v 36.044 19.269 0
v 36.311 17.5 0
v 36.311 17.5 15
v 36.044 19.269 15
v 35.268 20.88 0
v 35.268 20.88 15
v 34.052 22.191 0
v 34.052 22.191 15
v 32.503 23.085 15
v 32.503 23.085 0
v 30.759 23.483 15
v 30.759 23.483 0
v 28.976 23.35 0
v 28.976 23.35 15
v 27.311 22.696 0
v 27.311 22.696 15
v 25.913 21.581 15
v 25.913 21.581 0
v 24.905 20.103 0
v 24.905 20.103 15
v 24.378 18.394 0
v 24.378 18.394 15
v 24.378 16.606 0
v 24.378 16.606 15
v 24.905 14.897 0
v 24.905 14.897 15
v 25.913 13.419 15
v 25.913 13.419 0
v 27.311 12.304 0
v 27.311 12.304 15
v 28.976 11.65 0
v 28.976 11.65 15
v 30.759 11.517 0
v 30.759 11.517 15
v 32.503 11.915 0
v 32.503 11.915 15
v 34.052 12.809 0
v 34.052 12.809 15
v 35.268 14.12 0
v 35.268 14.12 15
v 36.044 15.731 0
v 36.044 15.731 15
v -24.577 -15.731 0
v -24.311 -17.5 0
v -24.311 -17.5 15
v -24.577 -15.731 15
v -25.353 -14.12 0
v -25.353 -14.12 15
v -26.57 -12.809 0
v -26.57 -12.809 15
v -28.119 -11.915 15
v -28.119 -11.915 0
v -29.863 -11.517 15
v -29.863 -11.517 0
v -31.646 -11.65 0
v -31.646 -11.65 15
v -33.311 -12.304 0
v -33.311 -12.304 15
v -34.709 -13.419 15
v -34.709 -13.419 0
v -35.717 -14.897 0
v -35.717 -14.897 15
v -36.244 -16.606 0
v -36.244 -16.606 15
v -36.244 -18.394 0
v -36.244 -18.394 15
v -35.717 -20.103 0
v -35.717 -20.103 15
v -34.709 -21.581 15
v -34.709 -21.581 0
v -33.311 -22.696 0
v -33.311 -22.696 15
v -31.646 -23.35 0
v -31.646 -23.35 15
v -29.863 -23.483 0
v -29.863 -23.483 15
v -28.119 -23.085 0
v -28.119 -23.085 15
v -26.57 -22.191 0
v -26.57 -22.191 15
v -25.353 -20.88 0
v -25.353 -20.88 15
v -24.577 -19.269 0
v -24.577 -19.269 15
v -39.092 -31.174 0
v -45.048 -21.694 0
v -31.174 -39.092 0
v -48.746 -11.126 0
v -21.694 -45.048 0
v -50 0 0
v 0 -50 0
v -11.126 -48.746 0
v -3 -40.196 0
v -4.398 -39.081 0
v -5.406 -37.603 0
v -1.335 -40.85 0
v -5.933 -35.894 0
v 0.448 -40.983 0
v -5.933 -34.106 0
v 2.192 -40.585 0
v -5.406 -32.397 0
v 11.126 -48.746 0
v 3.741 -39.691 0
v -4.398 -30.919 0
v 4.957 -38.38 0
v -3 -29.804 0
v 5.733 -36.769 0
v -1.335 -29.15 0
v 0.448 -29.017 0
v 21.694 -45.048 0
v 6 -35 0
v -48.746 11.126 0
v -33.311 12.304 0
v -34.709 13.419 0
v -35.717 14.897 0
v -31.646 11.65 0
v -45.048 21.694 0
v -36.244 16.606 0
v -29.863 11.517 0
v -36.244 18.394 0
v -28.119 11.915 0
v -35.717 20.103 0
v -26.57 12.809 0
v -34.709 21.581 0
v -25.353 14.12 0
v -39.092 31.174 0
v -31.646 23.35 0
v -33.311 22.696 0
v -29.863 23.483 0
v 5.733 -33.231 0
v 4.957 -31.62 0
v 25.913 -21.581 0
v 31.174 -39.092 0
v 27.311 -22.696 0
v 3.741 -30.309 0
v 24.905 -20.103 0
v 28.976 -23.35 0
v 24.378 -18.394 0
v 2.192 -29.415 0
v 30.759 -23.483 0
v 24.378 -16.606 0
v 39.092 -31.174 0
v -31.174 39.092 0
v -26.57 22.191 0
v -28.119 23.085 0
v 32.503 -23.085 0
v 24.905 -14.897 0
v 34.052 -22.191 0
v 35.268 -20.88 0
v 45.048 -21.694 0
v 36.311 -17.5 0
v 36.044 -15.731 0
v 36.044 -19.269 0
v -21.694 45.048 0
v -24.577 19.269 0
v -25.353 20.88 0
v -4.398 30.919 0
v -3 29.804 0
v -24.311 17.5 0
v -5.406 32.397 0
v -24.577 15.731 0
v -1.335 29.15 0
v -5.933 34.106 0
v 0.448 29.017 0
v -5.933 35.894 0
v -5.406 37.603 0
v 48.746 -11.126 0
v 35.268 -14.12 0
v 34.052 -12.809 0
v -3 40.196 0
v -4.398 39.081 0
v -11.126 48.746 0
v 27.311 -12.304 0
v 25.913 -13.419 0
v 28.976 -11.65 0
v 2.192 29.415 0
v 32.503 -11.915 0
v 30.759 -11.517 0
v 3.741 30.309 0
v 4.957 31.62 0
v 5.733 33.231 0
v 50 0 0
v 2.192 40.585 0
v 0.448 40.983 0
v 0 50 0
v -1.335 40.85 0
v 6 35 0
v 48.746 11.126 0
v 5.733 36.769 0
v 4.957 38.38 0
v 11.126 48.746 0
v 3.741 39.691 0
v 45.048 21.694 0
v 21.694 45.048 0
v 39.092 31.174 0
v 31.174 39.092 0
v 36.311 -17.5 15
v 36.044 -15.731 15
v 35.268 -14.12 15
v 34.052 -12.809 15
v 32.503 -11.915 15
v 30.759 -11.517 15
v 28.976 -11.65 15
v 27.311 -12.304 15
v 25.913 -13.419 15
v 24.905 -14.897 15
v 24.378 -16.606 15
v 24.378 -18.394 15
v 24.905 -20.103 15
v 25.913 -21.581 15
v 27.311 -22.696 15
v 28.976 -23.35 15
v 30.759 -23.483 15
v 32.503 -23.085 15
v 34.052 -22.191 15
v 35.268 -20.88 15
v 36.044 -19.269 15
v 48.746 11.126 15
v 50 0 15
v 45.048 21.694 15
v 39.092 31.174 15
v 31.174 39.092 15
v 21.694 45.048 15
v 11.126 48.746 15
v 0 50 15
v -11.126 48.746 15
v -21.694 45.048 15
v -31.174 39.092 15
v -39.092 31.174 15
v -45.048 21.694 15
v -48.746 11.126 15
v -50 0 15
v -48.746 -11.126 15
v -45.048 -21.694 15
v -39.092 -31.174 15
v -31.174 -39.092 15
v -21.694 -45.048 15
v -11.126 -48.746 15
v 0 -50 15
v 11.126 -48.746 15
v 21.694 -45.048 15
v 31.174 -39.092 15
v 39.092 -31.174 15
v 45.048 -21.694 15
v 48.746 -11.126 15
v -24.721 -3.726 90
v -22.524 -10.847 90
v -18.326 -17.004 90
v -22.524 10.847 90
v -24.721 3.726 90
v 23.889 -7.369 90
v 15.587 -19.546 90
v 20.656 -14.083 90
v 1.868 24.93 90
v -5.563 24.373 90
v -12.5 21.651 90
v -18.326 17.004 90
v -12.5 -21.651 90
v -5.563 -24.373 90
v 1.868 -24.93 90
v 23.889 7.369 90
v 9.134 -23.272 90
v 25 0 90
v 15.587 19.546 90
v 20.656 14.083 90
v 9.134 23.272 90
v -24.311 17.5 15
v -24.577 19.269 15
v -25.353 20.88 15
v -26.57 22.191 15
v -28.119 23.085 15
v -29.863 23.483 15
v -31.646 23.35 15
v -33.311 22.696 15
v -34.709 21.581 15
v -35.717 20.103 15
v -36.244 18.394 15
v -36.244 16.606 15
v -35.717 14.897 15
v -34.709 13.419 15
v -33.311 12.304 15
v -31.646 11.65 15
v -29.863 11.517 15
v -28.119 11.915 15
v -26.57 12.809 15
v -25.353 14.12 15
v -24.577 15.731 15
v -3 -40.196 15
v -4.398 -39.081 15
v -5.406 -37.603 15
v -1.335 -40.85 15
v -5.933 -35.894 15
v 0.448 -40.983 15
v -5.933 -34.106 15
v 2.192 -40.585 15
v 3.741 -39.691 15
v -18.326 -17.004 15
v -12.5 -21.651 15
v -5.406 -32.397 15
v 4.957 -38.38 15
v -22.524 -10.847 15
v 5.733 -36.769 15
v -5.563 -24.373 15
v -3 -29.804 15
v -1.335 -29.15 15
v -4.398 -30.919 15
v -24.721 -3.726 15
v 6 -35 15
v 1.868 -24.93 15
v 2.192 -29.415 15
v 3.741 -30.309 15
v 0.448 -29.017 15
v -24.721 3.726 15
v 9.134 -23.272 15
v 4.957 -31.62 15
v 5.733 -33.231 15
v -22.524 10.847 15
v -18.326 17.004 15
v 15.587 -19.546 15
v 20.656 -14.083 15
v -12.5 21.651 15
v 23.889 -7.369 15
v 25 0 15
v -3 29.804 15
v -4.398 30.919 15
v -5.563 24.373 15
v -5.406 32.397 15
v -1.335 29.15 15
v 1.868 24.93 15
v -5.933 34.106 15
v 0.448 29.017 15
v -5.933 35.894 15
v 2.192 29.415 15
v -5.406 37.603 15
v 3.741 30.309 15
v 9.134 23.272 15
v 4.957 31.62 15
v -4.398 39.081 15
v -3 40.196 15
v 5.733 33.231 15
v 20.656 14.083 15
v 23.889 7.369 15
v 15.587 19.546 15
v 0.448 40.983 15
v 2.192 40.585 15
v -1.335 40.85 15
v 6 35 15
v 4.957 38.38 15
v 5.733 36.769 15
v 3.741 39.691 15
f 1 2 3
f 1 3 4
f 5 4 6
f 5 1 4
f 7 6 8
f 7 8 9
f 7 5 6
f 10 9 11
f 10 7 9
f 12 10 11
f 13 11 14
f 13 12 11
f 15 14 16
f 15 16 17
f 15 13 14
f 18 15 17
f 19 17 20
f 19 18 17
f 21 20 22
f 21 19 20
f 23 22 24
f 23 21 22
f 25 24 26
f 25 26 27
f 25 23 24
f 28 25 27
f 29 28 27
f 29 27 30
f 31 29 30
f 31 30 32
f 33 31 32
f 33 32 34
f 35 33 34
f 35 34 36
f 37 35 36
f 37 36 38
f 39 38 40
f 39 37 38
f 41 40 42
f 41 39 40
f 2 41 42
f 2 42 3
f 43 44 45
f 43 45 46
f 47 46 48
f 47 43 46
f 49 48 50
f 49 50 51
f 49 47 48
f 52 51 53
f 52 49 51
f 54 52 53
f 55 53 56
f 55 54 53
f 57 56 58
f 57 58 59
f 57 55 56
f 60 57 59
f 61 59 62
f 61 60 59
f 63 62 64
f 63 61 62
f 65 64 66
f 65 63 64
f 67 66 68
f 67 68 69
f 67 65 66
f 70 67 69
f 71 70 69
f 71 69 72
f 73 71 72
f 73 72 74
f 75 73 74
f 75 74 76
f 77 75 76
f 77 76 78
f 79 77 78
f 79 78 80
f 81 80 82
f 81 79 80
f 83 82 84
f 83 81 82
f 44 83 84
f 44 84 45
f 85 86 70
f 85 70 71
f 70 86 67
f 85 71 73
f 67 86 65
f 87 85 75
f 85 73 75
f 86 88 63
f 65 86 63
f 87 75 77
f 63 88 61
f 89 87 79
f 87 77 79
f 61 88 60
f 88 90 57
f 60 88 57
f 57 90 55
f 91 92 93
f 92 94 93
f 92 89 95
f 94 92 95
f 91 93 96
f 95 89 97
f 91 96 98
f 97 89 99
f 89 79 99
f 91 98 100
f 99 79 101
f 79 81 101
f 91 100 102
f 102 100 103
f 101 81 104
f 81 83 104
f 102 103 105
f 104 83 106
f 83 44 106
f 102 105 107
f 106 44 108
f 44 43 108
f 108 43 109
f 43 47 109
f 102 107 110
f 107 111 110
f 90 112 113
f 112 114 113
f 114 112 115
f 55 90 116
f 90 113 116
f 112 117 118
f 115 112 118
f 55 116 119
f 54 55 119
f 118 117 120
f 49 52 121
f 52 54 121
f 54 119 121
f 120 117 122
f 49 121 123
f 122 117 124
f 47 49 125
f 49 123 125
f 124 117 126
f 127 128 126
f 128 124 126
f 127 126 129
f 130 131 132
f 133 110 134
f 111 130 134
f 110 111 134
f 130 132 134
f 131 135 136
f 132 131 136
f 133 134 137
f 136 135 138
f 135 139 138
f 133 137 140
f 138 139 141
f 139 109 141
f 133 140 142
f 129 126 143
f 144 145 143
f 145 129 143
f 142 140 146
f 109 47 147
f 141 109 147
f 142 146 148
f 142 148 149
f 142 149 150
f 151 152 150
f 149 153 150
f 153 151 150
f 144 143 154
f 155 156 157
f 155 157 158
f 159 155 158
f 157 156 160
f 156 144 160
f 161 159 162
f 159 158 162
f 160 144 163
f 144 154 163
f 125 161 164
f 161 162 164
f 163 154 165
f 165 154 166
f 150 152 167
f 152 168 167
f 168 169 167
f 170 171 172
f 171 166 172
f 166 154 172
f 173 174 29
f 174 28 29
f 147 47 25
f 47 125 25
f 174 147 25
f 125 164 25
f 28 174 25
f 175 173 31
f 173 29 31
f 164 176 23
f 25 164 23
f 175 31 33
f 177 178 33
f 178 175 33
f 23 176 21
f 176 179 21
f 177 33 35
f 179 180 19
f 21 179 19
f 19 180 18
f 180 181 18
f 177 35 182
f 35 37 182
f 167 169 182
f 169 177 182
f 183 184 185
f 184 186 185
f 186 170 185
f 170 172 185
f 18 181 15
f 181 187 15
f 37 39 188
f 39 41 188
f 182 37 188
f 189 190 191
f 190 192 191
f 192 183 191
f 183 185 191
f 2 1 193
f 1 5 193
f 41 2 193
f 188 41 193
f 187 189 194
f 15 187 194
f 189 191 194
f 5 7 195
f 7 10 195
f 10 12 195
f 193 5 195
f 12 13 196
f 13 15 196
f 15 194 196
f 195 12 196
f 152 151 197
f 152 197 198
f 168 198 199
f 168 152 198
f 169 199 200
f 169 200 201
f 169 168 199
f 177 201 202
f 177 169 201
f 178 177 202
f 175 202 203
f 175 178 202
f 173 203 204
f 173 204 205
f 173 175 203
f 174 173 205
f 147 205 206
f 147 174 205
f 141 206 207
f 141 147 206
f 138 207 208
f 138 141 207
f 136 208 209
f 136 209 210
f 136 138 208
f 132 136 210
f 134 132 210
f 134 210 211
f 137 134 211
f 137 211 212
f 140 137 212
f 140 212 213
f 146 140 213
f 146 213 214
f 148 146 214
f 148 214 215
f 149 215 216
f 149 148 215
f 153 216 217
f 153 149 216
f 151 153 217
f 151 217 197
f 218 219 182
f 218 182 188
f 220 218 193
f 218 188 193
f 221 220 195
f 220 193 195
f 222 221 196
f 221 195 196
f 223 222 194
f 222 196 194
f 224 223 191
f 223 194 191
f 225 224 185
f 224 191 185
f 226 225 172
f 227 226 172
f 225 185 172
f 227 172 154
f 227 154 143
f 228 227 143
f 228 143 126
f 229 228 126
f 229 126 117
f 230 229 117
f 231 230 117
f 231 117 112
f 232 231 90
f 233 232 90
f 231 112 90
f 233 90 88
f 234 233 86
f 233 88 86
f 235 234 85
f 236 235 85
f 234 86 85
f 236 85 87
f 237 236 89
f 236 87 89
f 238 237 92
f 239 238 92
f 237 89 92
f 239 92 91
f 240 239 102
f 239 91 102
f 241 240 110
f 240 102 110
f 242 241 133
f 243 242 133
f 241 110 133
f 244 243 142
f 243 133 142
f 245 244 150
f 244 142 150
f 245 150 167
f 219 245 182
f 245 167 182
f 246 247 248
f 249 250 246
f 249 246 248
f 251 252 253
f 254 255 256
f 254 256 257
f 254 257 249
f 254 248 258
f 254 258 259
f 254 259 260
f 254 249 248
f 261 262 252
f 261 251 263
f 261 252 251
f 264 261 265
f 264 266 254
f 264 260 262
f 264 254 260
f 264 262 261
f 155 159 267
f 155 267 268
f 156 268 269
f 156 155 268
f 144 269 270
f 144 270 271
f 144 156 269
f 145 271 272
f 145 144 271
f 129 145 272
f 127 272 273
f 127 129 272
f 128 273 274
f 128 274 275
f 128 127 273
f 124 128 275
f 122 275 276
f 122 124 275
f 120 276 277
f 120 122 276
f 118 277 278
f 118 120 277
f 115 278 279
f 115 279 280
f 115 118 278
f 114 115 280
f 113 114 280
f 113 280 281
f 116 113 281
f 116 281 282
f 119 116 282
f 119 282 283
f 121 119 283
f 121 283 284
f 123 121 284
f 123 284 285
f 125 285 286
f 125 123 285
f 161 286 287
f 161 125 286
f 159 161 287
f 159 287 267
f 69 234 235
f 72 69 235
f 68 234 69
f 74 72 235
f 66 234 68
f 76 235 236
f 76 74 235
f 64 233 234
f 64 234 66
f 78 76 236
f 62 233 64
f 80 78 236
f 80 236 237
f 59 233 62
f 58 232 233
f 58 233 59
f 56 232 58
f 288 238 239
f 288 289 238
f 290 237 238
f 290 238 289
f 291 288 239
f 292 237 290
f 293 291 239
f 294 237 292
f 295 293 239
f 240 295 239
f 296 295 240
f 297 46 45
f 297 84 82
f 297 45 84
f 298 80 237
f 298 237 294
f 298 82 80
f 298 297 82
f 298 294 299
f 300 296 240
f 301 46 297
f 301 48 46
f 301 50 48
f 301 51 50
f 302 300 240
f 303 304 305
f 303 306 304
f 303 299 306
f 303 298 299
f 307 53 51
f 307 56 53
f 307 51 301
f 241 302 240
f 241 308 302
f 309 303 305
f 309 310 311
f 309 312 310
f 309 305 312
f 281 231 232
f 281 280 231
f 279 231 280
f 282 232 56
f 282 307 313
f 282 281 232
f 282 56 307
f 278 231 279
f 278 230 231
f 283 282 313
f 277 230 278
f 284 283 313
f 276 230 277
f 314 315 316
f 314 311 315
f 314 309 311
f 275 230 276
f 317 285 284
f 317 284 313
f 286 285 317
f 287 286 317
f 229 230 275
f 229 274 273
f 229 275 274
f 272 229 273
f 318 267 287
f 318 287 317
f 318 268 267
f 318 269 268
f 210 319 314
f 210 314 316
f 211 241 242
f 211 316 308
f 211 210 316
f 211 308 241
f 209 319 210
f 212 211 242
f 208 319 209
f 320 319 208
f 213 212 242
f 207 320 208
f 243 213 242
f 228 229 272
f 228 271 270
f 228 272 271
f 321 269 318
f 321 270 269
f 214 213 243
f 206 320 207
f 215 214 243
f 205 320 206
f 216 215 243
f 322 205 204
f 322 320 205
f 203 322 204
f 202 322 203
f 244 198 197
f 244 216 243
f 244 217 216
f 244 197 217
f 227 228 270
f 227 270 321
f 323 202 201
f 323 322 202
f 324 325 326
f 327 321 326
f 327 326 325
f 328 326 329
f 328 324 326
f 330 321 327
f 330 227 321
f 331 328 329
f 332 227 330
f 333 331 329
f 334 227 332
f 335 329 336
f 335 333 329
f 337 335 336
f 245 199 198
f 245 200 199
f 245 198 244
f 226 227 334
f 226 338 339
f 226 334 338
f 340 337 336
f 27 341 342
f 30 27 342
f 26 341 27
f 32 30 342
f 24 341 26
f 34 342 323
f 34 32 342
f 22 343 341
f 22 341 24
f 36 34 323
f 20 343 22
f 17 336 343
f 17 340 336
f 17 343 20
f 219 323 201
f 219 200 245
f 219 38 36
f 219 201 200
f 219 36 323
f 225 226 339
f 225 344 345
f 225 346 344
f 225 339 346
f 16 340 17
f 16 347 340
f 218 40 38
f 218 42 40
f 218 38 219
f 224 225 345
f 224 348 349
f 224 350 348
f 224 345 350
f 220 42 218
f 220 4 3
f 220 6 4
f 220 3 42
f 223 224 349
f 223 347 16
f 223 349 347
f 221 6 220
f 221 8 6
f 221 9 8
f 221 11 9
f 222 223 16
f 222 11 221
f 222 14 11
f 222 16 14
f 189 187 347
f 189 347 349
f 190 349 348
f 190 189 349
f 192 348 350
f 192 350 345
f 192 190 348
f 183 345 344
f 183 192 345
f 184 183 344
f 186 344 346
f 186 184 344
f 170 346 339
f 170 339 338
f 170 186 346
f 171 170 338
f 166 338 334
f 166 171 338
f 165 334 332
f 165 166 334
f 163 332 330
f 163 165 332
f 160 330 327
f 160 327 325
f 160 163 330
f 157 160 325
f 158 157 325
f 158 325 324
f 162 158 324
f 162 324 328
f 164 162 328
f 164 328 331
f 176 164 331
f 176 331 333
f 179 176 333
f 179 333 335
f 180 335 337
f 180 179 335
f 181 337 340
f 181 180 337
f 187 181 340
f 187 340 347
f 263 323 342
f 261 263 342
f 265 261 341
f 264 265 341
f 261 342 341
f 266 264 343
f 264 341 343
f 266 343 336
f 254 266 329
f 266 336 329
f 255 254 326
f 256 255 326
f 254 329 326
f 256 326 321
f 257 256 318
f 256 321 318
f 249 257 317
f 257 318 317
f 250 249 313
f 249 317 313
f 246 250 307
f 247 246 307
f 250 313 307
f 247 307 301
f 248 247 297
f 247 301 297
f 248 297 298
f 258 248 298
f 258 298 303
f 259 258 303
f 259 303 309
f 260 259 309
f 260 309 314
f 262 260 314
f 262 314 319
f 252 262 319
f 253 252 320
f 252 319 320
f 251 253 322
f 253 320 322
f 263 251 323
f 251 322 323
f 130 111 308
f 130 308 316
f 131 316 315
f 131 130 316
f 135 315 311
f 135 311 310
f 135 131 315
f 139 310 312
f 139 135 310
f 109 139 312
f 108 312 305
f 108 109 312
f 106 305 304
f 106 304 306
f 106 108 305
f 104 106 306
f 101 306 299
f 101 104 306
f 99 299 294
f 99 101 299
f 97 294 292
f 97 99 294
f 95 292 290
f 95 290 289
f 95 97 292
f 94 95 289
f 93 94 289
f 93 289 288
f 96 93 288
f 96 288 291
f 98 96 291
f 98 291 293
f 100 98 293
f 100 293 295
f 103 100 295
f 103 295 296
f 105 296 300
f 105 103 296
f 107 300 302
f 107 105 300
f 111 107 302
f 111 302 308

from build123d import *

# Parameters (mm, degrees)
F0_R     = 50
F0_R_2   = 6
F1_DEPTH = 15
F2_R     = 25
F3_DEPTH = 75


with BuildPart() as f1:
    # F0 (on Top) → F1 (new body)
    with BuildSketch(Plane.XY):
        Circle(F0_R)
        with Locations((-30.310889, -17.5)):
            Circle(F0_R_2, mode=Mode.SUBTRACT)
        with Locations((0, -35)):
            Circle(F0_R_2, mode=Mode.SUBTRACT)
        with Locations((30.310889, -17.5)):
            Circle(F0_R_2, mode=Mode.SUBTRACT)
        with Locations((-30.310889, 17.5)):
            Circle(F0_R_2, mode=Mode.SUBTRACT)
        with Locations((30.310889, 17.5)):
            Circle(F0_R_2, mode=Mode.SUBTRACT)
        with Locations((0, 35)):
            Circle(F0_R_2, mode=Mode.SUBTRACT)
    extrude(amount=F1_DEPTH)

    # F2 (on face) → F3 (join)
    with BuildSketch(Plane.XY.offset(15)):
        Circle(F2_R)
    extrude(amount=F3_DEPTH)


solid = f1.part
